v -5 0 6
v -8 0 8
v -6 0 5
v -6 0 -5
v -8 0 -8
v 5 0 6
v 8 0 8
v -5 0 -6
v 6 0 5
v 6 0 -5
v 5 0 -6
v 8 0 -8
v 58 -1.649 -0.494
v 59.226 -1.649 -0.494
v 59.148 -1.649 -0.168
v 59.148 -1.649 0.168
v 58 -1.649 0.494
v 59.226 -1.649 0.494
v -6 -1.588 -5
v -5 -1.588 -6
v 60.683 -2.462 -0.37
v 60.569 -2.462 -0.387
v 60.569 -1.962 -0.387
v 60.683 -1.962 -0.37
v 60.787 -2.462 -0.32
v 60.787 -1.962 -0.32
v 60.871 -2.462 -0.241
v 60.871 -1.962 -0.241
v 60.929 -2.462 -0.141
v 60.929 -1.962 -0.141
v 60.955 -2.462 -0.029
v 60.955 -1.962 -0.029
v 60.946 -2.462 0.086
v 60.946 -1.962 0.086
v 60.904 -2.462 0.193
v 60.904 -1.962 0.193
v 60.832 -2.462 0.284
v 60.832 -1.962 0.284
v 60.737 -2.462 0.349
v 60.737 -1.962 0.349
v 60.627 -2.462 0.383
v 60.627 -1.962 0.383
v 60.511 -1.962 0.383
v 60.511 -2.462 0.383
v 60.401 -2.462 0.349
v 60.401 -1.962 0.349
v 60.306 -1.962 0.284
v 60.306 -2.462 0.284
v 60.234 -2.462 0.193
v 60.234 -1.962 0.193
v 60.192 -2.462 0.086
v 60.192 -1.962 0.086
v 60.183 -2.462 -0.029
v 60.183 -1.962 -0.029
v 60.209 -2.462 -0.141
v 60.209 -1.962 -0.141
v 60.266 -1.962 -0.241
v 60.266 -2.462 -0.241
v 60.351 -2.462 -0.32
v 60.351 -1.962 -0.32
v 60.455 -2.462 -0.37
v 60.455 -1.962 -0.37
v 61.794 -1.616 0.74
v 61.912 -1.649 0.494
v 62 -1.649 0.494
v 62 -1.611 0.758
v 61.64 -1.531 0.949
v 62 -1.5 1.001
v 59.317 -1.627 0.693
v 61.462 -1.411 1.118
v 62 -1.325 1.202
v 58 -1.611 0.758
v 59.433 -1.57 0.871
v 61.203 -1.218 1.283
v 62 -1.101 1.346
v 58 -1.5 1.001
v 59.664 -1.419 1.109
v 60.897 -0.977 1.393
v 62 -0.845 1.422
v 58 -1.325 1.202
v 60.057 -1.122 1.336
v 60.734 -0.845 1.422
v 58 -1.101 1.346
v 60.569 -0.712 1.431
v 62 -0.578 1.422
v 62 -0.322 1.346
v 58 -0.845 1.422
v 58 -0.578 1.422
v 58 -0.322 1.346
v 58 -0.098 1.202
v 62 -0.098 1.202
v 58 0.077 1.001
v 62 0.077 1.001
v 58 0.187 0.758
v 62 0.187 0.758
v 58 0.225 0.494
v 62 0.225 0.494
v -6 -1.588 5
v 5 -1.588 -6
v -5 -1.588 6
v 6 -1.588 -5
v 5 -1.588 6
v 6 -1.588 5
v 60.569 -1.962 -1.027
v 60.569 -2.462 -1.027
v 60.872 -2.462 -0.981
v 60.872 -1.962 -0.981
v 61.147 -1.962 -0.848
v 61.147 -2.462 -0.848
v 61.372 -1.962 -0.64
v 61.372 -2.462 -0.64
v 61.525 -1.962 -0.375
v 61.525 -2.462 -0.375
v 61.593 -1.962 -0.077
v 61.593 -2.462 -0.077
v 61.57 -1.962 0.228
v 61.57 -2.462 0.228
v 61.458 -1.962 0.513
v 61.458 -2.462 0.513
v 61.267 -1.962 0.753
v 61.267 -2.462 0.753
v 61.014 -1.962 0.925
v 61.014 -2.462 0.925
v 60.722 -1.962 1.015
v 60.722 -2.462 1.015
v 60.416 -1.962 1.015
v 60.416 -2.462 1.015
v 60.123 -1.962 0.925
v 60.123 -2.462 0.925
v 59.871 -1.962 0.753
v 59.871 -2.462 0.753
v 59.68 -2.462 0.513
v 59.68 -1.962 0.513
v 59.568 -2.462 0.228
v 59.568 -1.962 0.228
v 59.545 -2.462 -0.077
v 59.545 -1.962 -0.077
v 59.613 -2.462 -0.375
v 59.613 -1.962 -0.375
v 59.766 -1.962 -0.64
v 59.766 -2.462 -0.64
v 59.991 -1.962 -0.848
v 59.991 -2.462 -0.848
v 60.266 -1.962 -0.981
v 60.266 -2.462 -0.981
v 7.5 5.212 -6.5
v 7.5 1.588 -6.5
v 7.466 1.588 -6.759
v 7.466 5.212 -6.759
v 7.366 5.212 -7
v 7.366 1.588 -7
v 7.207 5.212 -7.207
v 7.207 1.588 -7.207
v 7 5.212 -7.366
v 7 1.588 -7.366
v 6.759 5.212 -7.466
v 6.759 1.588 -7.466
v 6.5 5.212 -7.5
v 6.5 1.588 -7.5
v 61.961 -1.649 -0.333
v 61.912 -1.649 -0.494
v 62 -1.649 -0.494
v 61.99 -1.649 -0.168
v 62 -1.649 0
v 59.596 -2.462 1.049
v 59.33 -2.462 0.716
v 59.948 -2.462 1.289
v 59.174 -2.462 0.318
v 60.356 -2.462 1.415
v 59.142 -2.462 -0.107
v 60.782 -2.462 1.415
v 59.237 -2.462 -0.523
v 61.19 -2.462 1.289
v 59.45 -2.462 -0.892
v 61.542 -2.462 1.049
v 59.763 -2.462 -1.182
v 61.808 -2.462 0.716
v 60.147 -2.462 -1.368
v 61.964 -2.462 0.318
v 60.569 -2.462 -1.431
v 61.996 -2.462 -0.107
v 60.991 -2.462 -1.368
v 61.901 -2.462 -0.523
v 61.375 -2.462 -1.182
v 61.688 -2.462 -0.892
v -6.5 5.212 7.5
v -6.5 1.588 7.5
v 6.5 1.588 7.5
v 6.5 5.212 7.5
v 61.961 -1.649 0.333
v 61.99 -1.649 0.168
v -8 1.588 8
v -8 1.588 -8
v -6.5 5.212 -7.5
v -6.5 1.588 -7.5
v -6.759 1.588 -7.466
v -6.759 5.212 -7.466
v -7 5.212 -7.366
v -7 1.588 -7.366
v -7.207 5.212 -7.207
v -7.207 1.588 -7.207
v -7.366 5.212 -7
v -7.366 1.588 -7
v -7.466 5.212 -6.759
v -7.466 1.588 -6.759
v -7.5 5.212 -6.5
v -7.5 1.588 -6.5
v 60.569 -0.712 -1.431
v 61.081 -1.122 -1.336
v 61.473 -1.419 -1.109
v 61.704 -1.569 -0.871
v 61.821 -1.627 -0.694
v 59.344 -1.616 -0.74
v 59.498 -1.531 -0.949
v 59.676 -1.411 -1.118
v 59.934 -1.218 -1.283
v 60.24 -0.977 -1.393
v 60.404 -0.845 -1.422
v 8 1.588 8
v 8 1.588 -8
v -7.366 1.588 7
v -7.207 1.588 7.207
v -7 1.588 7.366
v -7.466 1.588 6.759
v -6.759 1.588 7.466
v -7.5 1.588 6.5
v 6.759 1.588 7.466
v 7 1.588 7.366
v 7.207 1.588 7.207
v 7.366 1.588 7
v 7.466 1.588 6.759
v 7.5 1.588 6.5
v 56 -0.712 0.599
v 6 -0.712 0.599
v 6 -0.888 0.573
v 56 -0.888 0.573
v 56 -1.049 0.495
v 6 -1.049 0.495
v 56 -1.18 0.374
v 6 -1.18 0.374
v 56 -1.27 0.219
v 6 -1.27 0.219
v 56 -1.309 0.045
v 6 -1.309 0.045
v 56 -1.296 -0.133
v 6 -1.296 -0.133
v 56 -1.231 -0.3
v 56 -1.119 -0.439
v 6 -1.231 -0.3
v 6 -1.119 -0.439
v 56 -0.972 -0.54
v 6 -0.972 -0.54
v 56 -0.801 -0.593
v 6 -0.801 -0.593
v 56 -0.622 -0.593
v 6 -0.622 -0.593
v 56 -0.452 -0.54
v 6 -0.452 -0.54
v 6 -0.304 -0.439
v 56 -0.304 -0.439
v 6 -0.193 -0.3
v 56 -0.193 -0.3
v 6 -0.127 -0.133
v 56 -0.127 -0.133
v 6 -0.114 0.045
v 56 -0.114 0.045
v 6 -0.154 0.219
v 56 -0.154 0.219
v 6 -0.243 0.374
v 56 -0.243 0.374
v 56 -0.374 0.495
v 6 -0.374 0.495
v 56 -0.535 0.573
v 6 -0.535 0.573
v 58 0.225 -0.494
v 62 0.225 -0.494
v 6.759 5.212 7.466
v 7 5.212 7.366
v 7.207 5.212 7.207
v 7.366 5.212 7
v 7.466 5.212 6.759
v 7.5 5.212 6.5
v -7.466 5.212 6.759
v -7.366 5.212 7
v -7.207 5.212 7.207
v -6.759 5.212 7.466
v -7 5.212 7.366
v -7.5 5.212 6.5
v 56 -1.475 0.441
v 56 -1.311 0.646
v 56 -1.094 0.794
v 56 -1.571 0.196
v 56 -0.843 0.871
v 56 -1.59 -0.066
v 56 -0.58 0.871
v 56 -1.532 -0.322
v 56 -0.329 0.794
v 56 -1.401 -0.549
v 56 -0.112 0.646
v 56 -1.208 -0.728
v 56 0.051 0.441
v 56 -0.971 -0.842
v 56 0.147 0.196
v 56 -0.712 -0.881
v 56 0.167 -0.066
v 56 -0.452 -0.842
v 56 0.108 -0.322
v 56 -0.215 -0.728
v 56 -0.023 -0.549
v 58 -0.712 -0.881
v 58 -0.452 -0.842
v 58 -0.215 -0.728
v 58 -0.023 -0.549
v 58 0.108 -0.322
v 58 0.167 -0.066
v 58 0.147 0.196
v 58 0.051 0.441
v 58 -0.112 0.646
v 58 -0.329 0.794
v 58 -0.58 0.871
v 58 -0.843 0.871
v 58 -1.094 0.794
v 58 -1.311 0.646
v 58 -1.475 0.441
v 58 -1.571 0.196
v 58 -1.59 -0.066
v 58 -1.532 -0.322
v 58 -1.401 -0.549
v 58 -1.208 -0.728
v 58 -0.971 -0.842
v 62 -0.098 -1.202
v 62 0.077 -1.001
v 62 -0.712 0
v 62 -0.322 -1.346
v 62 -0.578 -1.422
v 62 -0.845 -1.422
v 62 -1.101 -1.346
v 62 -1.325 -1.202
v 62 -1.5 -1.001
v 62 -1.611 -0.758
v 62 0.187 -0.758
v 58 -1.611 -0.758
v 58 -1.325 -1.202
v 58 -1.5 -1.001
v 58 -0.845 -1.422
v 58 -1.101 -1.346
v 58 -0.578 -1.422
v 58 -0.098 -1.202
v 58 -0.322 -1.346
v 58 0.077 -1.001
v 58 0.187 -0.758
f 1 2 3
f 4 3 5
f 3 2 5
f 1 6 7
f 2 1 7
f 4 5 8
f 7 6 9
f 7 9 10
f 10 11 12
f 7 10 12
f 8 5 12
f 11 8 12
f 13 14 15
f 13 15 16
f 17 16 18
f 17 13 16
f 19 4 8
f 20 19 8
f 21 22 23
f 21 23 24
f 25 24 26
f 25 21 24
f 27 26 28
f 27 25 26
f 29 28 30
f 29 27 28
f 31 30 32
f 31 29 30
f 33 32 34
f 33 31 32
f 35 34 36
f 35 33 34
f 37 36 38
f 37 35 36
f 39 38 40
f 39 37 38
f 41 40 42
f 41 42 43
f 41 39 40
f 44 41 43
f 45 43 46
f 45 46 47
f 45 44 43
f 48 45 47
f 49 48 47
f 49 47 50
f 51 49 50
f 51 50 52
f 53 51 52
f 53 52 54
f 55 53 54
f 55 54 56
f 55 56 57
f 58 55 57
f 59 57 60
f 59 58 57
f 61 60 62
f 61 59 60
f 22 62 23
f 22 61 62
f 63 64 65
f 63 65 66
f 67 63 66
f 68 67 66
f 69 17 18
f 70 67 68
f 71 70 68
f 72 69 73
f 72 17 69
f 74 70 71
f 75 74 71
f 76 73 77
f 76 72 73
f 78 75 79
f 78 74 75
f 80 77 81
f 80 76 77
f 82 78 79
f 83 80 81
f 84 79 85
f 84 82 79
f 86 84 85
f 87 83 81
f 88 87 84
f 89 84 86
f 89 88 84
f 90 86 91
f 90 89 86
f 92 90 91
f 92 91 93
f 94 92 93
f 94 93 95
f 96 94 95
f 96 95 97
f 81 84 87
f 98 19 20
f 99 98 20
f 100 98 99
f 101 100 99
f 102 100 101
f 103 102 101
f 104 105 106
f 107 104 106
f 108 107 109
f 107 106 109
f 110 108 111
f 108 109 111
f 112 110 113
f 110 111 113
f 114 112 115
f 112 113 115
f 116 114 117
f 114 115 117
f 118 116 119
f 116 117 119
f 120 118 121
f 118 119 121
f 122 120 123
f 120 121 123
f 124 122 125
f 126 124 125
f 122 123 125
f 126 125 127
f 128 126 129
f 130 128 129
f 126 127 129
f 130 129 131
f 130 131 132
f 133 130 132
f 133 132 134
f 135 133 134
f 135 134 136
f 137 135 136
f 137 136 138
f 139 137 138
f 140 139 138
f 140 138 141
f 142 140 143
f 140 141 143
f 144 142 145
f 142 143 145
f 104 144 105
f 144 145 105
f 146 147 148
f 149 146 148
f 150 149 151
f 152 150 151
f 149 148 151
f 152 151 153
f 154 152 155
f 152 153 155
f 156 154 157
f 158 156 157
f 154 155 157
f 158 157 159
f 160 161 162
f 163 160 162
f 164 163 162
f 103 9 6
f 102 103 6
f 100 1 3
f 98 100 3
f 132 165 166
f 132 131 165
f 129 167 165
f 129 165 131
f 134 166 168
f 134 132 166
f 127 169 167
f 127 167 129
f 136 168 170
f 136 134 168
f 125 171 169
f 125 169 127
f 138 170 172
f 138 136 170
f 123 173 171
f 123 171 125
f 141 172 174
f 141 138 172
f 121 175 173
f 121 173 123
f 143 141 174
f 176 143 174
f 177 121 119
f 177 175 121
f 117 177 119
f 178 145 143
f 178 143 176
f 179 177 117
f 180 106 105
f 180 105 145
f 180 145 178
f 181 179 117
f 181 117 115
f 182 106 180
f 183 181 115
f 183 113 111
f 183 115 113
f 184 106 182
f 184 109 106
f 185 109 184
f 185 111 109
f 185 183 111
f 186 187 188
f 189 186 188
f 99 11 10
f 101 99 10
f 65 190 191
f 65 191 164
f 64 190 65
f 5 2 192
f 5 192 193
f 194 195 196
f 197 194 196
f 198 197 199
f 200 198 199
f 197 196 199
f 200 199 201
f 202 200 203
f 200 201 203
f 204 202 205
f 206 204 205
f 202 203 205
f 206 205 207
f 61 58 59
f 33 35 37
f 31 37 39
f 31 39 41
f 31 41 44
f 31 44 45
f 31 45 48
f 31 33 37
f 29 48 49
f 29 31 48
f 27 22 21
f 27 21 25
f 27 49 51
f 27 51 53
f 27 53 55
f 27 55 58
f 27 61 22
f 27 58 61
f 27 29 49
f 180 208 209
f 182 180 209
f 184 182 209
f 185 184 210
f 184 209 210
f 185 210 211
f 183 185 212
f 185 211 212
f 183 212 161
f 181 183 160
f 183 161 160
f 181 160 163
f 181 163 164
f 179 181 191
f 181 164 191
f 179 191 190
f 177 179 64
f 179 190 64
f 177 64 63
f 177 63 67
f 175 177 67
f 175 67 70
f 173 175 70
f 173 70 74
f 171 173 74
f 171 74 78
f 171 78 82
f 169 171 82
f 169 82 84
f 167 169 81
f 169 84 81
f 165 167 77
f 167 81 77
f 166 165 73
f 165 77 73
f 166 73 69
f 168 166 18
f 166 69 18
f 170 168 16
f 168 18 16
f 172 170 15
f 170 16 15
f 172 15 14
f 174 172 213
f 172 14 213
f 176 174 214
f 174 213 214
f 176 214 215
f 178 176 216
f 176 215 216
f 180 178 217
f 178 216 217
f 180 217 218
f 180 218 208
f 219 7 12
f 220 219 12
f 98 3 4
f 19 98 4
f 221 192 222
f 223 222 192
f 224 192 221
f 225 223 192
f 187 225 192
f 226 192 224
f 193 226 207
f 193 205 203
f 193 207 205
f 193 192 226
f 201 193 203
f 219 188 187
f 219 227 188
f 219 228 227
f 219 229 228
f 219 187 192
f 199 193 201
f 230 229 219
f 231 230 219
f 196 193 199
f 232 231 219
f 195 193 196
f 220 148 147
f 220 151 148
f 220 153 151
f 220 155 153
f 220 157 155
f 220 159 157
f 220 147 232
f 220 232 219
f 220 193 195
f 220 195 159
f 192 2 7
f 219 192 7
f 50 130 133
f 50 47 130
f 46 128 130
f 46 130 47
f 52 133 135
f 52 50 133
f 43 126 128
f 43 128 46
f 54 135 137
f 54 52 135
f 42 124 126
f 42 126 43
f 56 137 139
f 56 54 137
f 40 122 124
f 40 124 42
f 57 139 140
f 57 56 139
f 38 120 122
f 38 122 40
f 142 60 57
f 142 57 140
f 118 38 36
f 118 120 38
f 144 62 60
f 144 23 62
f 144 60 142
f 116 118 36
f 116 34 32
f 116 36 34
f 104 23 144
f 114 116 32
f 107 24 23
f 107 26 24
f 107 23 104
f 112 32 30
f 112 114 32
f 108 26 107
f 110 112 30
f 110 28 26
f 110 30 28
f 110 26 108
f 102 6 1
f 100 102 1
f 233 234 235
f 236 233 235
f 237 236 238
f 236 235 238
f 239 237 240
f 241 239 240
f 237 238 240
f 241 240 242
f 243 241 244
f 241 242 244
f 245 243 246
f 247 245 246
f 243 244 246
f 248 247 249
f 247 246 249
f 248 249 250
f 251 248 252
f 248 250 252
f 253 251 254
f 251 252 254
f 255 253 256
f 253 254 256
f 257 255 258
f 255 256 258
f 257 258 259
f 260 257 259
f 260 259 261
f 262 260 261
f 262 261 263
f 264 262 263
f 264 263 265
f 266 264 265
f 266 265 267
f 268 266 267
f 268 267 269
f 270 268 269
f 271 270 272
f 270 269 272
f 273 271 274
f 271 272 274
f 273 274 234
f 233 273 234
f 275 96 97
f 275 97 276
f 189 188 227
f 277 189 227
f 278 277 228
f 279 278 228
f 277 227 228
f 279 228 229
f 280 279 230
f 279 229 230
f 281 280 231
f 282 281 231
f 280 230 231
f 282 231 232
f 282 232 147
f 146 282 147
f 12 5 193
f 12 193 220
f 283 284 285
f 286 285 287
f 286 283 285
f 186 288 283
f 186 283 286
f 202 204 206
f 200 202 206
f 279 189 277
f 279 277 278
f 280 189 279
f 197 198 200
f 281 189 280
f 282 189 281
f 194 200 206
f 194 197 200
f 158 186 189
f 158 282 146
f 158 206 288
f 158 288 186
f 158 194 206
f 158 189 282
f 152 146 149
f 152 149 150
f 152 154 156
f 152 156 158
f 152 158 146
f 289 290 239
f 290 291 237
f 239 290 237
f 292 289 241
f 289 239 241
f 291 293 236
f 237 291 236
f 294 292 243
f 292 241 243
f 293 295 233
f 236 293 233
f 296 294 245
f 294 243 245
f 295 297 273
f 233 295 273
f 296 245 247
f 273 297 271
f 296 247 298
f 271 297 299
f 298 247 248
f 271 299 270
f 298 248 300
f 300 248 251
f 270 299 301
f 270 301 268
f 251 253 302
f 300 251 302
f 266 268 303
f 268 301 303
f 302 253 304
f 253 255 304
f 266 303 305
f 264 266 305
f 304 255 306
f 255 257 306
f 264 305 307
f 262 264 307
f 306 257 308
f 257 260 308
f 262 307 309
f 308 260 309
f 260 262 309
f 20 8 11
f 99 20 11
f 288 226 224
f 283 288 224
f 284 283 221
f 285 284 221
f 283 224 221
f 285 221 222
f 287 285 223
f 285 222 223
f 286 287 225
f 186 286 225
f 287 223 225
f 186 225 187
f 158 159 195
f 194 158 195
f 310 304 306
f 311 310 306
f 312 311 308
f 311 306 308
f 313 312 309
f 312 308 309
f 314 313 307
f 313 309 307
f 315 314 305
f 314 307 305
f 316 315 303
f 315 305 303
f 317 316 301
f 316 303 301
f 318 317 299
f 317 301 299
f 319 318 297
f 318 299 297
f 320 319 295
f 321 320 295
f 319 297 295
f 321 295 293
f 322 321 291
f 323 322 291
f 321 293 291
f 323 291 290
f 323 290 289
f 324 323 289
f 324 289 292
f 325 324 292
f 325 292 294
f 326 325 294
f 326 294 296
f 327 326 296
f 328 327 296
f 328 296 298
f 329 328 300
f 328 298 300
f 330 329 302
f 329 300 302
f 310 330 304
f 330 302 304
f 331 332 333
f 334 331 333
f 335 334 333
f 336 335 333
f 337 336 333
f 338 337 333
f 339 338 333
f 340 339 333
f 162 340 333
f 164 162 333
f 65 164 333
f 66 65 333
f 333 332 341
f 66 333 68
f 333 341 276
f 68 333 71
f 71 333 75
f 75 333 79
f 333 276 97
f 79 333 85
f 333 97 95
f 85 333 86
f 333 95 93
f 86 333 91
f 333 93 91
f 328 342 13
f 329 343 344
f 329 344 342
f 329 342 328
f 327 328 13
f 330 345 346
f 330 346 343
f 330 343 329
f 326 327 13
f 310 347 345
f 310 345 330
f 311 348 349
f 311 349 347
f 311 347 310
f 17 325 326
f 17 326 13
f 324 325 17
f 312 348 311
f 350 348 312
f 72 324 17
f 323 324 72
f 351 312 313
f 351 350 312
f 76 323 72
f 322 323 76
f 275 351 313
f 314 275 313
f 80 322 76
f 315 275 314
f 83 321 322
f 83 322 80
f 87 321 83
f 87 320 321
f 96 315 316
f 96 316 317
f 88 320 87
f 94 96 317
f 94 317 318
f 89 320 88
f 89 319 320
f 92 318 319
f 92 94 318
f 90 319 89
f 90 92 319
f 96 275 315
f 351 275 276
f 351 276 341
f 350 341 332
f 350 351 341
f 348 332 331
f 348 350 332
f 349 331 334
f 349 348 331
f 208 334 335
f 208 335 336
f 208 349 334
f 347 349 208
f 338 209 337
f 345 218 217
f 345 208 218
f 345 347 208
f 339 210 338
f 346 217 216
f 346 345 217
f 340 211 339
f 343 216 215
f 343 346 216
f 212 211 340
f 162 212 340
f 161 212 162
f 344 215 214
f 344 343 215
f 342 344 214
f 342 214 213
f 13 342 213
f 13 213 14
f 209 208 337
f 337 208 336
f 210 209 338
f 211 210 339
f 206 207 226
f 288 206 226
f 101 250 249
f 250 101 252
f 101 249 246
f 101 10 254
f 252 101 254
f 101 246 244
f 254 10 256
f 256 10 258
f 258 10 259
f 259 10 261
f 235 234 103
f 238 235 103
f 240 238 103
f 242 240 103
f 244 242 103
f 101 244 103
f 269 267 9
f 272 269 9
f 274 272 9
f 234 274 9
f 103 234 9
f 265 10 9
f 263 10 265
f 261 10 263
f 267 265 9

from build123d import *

# Parameters (mm, degrees)
SKETCH1_W           = 16
SKETCH1_H           = 16
BOSS_EXTRUDE1_DEPTH = 1.5875
BOSS_EXTRUDE2_DEPTH = 3.625
BOSS_EXTRUDE3_DEPTH = 1.5875
SKETCH5_R           = 0.599365756
BOSS_EXTRUDE6_DEPTH = 50
SKETCH6_R           = 0.881021891
BOSS_EXTRUDE7_DEPTH = 2
BOSS_EXTRUDE8_DEPTH = 4
SKETCH8_R           = 1.431086417
BOSS_EXTRUDE9_DEPTH = 1.75
SKETCH9_R           = 1.026782917
SKETCH9_R_2         = 0.386874667
CUT_EXTRUDE1_DEPTH  = 0.5


with BuildPart() as part:
    # Sketch1 → Boss-Extrude1 (new body)
    with BuildSketch(Plane(origin=(0, 0, 0), x_dir=(1, 0, 0), z_dir=(0, 1, 0))):
        Rectangle(SKETCH1_W, SKETCH1_H)
    extrude(amount=BOSS_EXTRUDE1_DEPTH)

    # Sketch2 → Boss-Extrude2 (add)
    with BuildSketch(Plane(origin=(0, 1.5875, 0), x_dir=(1, 0, 0), z_dir=(0, 1, 0))):
        with BuildLine():
            Line((-6.5, -7.5), (6.5, -7.5))
            ThreePointArc((6.5, -7.5), (7.207106781, -7.207106781), (7.5, -6.5))
            Line((7.5, -6.5), (7.5, 6.5))
            ThreePointArc((7.5, 6.5), (7.207106781, 7.207106781), (6.5, 7.5))
            Line((6.5, 7.5), (-6.5, 7.5))
            ThreePointArc((-6.5, 7.5), (-7.207106781, 7.207106781), (-7.5, 6.5))
            Line((-7.5, 6.5), (-7.5, -6.5))
            ThreePointArc((-7.5, -6.5), (-7.207106781, -7.207106781), (-6.5, -7.5))
        make_face()
    extrude(amount=BOSS_EXTRUDE2_DEPTH)

    # Sketch4 → Boss-Extrude3 (add)
    with BuildSketch(Plane.XZ):
        Polygon((5, 6), (-5, 6), (-6, 5), (-6, -5), (-5, -6), (5, -6), (6, -5), (6, 5), align=None)
    extrude(amount=BOSS_EXTRUDE3_DEPTH)

    # Sketch5 → Boss-Extrude6 (add)
    with BuildSketch(Plane(origin=(6, 0, 0), x_dir=(0, 0, -1), z_dir=(1, 0, 0))):
        with Locations(Location((0, -0.711731406, 0), (0, 0, 180))):
            Circle(SKETCH5_R)
    extrude(amount=BOSS_EXTRUDE6_DEPTH)

    # Sketch6 → Boss-Extrude7 (add)
    with BuildSketch(Plane(origin=(56, 0, 0), x_dir=(0, 0, -1), z_dir=(1, 0, 0))):
        with Locations((0, -0.711731406)):
            Circle(SKETCH6_R)
    extrude(amount=BOSS_EXTRUDE7_DEPTH)

    # Sketch7 → Boss-Extrude8 (add)
    with BuildSketch(Plane(origin=(58, 0, 0), x_dir=(0, 0, -1), z_dir=(1, 0, 0))):
        with BuildLine():
            Line((-0.493950471, 0.22540454), (0.493950471, 0.22540454))
            ThreePointArc((0.493950471, 0.22540454), (1.431086417, -0.711731406), (0.493950471, -1.648867351))
            Line((0.493950471, -1.648867351), (-0.493950471, -1.648867351))
            ThreePointArc((-0.493950471, -1.648867351), (-1.431086417, -0.711731406), (-0.493950471, 0.22540454))
        make_face()
    extrude(amount=BOSS_EXTRUDE8_DEPTH)

    # Sketch8 → Boss-Extrude9 (add)
    with BuildSketch(Plane.XZ.offset(0.711731406)):
        with Locations(Location((60.568913583, 0, 0), (0, 0, 270))):
            Circle(SKETCH8_R)
    extrude(amount=BOSS_EXTRUDE9_DEPTH)

    # Sketch9 → Cut-Extrude1 (cut)
    with BuildSketch(Plane(origin=(0, -2.461731406, 0), x_dir=(-1, 0, 0), z_dir=(0, -1, 0))):
        with Locations(Location((-60.568913583, 0, 0), (0, 0, 90))):
            Circle(SKETCH9_R)
        with Locations(Location((-60.568913583, 0, 0), (0, 0, 90))):
            Circle(SKETCH9_R_2, mode=Mode.SUBTRACT)
    extrude(amount=-CUT_EXTRUDE1_DEPTH, mode=Mode.SUBTRACT)


solid = part.part
